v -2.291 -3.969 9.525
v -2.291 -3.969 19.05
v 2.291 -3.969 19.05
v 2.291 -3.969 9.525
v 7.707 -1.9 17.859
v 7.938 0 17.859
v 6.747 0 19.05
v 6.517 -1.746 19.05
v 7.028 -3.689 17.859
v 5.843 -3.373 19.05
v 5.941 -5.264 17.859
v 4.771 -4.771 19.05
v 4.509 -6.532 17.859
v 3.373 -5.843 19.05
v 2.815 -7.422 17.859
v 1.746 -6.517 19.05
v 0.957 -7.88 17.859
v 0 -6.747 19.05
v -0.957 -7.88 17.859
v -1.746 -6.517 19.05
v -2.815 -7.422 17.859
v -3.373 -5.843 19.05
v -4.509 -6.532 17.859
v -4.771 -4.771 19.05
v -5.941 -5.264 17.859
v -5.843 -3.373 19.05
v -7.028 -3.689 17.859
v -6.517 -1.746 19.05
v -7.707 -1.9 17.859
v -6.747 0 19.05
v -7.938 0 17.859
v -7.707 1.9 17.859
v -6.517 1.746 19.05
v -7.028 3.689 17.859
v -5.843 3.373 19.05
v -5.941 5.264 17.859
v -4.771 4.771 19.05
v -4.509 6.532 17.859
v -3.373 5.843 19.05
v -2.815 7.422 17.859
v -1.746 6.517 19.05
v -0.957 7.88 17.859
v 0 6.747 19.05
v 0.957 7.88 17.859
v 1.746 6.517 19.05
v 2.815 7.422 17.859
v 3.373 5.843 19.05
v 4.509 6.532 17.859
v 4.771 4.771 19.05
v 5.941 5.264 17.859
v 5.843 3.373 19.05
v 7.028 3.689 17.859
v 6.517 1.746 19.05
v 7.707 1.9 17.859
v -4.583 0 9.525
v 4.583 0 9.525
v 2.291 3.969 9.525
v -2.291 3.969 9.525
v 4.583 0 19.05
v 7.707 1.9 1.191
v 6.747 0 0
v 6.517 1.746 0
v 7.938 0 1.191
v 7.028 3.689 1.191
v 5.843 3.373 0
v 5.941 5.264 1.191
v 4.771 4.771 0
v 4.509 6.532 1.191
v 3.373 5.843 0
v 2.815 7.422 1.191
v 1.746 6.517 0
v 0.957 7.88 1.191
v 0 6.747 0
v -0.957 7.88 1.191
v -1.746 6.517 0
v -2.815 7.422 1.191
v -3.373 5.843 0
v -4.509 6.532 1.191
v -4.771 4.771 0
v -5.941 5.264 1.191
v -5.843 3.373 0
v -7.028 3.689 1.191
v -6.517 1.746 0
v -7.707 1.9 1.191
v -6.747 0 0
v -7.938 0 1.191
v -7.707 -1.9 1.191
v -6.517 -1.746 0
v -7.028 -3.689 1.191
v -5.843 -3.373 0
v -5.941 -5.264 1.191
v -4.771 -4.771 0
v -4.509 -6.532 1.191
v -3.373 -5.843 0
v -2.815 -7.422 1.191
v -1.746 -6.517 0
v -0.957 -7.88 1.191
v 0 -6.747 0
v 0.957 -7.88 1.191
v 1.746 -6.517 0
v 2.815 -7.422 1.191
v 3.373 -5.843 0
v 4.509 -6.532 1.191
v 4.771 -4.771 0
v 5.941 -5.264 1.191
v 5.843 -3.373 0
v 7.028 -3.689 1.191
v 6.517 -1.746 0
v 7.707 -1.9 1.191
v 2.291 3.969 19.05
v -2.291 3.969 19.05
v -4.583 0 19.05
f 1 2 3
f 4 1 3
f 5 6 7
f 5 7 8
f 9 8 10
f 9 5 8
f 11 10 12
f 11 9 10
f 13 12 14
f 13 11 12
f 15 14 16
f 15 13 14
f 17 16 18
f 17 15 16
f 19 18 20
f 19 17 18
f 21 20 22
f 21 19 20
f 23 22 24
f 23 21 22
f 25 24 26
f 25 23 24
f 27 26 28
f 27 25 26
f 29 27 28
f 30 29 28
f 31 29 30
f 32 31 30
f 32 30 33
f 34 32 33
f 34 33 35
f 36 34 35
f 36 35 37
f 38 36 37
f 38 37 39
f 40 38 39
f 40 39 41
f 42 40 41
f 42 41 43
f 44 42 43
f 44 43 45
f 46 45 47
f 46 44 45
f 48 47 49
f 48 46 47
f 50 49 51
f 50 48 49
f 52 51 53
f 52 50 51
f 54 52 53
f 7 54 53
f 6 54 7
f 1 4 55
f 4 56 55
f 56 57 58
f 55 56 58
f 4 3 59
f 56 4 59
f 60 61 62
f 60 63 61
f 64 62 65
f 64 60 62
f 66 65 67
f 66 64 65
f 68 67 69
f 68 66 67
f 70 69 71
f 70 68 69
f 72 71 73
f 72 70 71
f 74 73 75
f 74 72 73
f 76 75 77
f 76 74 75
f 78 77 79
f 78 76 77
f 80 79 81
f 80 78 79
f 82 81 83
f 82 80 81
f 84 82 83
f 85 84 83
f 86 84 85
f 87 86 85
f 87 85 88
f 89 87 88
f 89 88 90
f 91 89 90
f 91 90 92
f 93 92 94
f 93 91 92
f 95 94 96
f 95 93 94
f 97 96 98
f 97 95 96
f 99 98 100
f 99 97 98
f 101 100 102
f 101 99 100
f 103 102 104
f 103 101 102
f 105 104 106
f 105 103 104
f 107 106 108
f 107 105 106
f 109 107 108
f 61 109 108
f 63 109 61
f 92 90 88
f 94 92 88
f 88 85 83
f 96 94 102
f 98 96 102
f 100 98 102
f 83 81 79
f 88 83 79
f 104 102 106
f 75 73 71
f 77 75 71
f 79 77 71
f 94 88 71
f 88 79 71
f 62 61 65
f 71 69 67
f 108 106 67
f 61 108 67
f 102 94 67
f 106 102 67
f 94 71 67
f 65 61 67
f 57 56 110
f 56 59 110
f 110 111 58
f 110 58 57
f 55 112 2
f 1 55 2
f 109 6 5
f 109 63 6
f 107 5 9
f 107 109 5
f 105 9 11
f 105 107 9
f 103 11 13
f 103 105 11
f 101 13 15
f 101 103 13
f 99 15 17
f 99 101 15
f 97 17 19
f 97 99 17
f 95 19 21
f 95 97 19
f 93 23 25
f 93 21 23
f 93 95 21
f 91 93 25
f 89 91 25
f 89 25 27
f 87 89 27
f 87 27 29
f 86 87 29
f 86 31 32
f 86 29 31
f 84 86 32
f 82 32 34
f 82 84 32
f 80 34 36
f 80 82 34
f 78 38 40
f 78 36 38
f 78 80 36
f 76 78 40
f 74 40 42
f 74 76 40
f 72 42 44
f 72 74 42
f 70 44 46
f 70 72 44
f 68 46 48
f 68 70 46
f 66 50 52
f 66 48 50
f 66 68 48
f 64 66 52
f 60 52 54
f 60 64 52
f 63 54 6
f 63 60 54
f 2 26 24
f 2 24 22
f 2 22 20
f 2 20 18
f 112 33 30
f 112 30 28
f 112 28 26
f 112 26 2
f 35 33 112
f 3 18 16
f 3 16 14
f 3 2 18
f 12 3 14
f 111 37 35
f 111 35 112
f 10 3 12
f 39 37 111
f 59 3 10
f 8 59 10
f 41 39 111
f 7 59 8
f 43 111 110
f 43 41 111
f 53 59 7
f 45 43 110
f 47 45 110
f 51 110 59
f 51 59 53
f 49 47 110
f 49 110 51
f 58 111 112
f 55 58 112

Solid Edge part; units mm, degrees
sketch "Sketch1" plane through (0, 0, 0) normal (0, 0, 1) x (1, 0, 0)
  circle A0 centre (0, 0) radius 7.9375
  dimension "D1" = 15.875
extrude "Protrusion1" add sketch "Sketch1" along normal blind 19.05
chamfer "Chamfer1" distance 1.1906 angle 45 2 edges at (-7.9375, 0, 0) (-7.9375, 0, 19.05)
sketch "Sketch2" plane through (0, 0, 19.05) normal (0, 0, 1) x (1, 0, 0)
  line L0 (-2.2914, 3.9688) -> (2.2914, 3.9688)
  line L1 (4.5827, 0) -> (2.2914, 3.9687)
  line L2 (2.2914, -3.9688) -> (4.5827, 0)
  line L3 (-2.2914, -3.9688) -> (2.2914, -3.9688)
  line L4 (-4.5827, 0) -> (-2.2914, -3.9688)
  line L5 (-2.2914, 3.9687) -> (-4.5827, 0)
  dimension "D1" = 7.9375
extrude "Cutout1" cut sketch "Sketch2" against normal blind 9.525
properties part number "116405"
